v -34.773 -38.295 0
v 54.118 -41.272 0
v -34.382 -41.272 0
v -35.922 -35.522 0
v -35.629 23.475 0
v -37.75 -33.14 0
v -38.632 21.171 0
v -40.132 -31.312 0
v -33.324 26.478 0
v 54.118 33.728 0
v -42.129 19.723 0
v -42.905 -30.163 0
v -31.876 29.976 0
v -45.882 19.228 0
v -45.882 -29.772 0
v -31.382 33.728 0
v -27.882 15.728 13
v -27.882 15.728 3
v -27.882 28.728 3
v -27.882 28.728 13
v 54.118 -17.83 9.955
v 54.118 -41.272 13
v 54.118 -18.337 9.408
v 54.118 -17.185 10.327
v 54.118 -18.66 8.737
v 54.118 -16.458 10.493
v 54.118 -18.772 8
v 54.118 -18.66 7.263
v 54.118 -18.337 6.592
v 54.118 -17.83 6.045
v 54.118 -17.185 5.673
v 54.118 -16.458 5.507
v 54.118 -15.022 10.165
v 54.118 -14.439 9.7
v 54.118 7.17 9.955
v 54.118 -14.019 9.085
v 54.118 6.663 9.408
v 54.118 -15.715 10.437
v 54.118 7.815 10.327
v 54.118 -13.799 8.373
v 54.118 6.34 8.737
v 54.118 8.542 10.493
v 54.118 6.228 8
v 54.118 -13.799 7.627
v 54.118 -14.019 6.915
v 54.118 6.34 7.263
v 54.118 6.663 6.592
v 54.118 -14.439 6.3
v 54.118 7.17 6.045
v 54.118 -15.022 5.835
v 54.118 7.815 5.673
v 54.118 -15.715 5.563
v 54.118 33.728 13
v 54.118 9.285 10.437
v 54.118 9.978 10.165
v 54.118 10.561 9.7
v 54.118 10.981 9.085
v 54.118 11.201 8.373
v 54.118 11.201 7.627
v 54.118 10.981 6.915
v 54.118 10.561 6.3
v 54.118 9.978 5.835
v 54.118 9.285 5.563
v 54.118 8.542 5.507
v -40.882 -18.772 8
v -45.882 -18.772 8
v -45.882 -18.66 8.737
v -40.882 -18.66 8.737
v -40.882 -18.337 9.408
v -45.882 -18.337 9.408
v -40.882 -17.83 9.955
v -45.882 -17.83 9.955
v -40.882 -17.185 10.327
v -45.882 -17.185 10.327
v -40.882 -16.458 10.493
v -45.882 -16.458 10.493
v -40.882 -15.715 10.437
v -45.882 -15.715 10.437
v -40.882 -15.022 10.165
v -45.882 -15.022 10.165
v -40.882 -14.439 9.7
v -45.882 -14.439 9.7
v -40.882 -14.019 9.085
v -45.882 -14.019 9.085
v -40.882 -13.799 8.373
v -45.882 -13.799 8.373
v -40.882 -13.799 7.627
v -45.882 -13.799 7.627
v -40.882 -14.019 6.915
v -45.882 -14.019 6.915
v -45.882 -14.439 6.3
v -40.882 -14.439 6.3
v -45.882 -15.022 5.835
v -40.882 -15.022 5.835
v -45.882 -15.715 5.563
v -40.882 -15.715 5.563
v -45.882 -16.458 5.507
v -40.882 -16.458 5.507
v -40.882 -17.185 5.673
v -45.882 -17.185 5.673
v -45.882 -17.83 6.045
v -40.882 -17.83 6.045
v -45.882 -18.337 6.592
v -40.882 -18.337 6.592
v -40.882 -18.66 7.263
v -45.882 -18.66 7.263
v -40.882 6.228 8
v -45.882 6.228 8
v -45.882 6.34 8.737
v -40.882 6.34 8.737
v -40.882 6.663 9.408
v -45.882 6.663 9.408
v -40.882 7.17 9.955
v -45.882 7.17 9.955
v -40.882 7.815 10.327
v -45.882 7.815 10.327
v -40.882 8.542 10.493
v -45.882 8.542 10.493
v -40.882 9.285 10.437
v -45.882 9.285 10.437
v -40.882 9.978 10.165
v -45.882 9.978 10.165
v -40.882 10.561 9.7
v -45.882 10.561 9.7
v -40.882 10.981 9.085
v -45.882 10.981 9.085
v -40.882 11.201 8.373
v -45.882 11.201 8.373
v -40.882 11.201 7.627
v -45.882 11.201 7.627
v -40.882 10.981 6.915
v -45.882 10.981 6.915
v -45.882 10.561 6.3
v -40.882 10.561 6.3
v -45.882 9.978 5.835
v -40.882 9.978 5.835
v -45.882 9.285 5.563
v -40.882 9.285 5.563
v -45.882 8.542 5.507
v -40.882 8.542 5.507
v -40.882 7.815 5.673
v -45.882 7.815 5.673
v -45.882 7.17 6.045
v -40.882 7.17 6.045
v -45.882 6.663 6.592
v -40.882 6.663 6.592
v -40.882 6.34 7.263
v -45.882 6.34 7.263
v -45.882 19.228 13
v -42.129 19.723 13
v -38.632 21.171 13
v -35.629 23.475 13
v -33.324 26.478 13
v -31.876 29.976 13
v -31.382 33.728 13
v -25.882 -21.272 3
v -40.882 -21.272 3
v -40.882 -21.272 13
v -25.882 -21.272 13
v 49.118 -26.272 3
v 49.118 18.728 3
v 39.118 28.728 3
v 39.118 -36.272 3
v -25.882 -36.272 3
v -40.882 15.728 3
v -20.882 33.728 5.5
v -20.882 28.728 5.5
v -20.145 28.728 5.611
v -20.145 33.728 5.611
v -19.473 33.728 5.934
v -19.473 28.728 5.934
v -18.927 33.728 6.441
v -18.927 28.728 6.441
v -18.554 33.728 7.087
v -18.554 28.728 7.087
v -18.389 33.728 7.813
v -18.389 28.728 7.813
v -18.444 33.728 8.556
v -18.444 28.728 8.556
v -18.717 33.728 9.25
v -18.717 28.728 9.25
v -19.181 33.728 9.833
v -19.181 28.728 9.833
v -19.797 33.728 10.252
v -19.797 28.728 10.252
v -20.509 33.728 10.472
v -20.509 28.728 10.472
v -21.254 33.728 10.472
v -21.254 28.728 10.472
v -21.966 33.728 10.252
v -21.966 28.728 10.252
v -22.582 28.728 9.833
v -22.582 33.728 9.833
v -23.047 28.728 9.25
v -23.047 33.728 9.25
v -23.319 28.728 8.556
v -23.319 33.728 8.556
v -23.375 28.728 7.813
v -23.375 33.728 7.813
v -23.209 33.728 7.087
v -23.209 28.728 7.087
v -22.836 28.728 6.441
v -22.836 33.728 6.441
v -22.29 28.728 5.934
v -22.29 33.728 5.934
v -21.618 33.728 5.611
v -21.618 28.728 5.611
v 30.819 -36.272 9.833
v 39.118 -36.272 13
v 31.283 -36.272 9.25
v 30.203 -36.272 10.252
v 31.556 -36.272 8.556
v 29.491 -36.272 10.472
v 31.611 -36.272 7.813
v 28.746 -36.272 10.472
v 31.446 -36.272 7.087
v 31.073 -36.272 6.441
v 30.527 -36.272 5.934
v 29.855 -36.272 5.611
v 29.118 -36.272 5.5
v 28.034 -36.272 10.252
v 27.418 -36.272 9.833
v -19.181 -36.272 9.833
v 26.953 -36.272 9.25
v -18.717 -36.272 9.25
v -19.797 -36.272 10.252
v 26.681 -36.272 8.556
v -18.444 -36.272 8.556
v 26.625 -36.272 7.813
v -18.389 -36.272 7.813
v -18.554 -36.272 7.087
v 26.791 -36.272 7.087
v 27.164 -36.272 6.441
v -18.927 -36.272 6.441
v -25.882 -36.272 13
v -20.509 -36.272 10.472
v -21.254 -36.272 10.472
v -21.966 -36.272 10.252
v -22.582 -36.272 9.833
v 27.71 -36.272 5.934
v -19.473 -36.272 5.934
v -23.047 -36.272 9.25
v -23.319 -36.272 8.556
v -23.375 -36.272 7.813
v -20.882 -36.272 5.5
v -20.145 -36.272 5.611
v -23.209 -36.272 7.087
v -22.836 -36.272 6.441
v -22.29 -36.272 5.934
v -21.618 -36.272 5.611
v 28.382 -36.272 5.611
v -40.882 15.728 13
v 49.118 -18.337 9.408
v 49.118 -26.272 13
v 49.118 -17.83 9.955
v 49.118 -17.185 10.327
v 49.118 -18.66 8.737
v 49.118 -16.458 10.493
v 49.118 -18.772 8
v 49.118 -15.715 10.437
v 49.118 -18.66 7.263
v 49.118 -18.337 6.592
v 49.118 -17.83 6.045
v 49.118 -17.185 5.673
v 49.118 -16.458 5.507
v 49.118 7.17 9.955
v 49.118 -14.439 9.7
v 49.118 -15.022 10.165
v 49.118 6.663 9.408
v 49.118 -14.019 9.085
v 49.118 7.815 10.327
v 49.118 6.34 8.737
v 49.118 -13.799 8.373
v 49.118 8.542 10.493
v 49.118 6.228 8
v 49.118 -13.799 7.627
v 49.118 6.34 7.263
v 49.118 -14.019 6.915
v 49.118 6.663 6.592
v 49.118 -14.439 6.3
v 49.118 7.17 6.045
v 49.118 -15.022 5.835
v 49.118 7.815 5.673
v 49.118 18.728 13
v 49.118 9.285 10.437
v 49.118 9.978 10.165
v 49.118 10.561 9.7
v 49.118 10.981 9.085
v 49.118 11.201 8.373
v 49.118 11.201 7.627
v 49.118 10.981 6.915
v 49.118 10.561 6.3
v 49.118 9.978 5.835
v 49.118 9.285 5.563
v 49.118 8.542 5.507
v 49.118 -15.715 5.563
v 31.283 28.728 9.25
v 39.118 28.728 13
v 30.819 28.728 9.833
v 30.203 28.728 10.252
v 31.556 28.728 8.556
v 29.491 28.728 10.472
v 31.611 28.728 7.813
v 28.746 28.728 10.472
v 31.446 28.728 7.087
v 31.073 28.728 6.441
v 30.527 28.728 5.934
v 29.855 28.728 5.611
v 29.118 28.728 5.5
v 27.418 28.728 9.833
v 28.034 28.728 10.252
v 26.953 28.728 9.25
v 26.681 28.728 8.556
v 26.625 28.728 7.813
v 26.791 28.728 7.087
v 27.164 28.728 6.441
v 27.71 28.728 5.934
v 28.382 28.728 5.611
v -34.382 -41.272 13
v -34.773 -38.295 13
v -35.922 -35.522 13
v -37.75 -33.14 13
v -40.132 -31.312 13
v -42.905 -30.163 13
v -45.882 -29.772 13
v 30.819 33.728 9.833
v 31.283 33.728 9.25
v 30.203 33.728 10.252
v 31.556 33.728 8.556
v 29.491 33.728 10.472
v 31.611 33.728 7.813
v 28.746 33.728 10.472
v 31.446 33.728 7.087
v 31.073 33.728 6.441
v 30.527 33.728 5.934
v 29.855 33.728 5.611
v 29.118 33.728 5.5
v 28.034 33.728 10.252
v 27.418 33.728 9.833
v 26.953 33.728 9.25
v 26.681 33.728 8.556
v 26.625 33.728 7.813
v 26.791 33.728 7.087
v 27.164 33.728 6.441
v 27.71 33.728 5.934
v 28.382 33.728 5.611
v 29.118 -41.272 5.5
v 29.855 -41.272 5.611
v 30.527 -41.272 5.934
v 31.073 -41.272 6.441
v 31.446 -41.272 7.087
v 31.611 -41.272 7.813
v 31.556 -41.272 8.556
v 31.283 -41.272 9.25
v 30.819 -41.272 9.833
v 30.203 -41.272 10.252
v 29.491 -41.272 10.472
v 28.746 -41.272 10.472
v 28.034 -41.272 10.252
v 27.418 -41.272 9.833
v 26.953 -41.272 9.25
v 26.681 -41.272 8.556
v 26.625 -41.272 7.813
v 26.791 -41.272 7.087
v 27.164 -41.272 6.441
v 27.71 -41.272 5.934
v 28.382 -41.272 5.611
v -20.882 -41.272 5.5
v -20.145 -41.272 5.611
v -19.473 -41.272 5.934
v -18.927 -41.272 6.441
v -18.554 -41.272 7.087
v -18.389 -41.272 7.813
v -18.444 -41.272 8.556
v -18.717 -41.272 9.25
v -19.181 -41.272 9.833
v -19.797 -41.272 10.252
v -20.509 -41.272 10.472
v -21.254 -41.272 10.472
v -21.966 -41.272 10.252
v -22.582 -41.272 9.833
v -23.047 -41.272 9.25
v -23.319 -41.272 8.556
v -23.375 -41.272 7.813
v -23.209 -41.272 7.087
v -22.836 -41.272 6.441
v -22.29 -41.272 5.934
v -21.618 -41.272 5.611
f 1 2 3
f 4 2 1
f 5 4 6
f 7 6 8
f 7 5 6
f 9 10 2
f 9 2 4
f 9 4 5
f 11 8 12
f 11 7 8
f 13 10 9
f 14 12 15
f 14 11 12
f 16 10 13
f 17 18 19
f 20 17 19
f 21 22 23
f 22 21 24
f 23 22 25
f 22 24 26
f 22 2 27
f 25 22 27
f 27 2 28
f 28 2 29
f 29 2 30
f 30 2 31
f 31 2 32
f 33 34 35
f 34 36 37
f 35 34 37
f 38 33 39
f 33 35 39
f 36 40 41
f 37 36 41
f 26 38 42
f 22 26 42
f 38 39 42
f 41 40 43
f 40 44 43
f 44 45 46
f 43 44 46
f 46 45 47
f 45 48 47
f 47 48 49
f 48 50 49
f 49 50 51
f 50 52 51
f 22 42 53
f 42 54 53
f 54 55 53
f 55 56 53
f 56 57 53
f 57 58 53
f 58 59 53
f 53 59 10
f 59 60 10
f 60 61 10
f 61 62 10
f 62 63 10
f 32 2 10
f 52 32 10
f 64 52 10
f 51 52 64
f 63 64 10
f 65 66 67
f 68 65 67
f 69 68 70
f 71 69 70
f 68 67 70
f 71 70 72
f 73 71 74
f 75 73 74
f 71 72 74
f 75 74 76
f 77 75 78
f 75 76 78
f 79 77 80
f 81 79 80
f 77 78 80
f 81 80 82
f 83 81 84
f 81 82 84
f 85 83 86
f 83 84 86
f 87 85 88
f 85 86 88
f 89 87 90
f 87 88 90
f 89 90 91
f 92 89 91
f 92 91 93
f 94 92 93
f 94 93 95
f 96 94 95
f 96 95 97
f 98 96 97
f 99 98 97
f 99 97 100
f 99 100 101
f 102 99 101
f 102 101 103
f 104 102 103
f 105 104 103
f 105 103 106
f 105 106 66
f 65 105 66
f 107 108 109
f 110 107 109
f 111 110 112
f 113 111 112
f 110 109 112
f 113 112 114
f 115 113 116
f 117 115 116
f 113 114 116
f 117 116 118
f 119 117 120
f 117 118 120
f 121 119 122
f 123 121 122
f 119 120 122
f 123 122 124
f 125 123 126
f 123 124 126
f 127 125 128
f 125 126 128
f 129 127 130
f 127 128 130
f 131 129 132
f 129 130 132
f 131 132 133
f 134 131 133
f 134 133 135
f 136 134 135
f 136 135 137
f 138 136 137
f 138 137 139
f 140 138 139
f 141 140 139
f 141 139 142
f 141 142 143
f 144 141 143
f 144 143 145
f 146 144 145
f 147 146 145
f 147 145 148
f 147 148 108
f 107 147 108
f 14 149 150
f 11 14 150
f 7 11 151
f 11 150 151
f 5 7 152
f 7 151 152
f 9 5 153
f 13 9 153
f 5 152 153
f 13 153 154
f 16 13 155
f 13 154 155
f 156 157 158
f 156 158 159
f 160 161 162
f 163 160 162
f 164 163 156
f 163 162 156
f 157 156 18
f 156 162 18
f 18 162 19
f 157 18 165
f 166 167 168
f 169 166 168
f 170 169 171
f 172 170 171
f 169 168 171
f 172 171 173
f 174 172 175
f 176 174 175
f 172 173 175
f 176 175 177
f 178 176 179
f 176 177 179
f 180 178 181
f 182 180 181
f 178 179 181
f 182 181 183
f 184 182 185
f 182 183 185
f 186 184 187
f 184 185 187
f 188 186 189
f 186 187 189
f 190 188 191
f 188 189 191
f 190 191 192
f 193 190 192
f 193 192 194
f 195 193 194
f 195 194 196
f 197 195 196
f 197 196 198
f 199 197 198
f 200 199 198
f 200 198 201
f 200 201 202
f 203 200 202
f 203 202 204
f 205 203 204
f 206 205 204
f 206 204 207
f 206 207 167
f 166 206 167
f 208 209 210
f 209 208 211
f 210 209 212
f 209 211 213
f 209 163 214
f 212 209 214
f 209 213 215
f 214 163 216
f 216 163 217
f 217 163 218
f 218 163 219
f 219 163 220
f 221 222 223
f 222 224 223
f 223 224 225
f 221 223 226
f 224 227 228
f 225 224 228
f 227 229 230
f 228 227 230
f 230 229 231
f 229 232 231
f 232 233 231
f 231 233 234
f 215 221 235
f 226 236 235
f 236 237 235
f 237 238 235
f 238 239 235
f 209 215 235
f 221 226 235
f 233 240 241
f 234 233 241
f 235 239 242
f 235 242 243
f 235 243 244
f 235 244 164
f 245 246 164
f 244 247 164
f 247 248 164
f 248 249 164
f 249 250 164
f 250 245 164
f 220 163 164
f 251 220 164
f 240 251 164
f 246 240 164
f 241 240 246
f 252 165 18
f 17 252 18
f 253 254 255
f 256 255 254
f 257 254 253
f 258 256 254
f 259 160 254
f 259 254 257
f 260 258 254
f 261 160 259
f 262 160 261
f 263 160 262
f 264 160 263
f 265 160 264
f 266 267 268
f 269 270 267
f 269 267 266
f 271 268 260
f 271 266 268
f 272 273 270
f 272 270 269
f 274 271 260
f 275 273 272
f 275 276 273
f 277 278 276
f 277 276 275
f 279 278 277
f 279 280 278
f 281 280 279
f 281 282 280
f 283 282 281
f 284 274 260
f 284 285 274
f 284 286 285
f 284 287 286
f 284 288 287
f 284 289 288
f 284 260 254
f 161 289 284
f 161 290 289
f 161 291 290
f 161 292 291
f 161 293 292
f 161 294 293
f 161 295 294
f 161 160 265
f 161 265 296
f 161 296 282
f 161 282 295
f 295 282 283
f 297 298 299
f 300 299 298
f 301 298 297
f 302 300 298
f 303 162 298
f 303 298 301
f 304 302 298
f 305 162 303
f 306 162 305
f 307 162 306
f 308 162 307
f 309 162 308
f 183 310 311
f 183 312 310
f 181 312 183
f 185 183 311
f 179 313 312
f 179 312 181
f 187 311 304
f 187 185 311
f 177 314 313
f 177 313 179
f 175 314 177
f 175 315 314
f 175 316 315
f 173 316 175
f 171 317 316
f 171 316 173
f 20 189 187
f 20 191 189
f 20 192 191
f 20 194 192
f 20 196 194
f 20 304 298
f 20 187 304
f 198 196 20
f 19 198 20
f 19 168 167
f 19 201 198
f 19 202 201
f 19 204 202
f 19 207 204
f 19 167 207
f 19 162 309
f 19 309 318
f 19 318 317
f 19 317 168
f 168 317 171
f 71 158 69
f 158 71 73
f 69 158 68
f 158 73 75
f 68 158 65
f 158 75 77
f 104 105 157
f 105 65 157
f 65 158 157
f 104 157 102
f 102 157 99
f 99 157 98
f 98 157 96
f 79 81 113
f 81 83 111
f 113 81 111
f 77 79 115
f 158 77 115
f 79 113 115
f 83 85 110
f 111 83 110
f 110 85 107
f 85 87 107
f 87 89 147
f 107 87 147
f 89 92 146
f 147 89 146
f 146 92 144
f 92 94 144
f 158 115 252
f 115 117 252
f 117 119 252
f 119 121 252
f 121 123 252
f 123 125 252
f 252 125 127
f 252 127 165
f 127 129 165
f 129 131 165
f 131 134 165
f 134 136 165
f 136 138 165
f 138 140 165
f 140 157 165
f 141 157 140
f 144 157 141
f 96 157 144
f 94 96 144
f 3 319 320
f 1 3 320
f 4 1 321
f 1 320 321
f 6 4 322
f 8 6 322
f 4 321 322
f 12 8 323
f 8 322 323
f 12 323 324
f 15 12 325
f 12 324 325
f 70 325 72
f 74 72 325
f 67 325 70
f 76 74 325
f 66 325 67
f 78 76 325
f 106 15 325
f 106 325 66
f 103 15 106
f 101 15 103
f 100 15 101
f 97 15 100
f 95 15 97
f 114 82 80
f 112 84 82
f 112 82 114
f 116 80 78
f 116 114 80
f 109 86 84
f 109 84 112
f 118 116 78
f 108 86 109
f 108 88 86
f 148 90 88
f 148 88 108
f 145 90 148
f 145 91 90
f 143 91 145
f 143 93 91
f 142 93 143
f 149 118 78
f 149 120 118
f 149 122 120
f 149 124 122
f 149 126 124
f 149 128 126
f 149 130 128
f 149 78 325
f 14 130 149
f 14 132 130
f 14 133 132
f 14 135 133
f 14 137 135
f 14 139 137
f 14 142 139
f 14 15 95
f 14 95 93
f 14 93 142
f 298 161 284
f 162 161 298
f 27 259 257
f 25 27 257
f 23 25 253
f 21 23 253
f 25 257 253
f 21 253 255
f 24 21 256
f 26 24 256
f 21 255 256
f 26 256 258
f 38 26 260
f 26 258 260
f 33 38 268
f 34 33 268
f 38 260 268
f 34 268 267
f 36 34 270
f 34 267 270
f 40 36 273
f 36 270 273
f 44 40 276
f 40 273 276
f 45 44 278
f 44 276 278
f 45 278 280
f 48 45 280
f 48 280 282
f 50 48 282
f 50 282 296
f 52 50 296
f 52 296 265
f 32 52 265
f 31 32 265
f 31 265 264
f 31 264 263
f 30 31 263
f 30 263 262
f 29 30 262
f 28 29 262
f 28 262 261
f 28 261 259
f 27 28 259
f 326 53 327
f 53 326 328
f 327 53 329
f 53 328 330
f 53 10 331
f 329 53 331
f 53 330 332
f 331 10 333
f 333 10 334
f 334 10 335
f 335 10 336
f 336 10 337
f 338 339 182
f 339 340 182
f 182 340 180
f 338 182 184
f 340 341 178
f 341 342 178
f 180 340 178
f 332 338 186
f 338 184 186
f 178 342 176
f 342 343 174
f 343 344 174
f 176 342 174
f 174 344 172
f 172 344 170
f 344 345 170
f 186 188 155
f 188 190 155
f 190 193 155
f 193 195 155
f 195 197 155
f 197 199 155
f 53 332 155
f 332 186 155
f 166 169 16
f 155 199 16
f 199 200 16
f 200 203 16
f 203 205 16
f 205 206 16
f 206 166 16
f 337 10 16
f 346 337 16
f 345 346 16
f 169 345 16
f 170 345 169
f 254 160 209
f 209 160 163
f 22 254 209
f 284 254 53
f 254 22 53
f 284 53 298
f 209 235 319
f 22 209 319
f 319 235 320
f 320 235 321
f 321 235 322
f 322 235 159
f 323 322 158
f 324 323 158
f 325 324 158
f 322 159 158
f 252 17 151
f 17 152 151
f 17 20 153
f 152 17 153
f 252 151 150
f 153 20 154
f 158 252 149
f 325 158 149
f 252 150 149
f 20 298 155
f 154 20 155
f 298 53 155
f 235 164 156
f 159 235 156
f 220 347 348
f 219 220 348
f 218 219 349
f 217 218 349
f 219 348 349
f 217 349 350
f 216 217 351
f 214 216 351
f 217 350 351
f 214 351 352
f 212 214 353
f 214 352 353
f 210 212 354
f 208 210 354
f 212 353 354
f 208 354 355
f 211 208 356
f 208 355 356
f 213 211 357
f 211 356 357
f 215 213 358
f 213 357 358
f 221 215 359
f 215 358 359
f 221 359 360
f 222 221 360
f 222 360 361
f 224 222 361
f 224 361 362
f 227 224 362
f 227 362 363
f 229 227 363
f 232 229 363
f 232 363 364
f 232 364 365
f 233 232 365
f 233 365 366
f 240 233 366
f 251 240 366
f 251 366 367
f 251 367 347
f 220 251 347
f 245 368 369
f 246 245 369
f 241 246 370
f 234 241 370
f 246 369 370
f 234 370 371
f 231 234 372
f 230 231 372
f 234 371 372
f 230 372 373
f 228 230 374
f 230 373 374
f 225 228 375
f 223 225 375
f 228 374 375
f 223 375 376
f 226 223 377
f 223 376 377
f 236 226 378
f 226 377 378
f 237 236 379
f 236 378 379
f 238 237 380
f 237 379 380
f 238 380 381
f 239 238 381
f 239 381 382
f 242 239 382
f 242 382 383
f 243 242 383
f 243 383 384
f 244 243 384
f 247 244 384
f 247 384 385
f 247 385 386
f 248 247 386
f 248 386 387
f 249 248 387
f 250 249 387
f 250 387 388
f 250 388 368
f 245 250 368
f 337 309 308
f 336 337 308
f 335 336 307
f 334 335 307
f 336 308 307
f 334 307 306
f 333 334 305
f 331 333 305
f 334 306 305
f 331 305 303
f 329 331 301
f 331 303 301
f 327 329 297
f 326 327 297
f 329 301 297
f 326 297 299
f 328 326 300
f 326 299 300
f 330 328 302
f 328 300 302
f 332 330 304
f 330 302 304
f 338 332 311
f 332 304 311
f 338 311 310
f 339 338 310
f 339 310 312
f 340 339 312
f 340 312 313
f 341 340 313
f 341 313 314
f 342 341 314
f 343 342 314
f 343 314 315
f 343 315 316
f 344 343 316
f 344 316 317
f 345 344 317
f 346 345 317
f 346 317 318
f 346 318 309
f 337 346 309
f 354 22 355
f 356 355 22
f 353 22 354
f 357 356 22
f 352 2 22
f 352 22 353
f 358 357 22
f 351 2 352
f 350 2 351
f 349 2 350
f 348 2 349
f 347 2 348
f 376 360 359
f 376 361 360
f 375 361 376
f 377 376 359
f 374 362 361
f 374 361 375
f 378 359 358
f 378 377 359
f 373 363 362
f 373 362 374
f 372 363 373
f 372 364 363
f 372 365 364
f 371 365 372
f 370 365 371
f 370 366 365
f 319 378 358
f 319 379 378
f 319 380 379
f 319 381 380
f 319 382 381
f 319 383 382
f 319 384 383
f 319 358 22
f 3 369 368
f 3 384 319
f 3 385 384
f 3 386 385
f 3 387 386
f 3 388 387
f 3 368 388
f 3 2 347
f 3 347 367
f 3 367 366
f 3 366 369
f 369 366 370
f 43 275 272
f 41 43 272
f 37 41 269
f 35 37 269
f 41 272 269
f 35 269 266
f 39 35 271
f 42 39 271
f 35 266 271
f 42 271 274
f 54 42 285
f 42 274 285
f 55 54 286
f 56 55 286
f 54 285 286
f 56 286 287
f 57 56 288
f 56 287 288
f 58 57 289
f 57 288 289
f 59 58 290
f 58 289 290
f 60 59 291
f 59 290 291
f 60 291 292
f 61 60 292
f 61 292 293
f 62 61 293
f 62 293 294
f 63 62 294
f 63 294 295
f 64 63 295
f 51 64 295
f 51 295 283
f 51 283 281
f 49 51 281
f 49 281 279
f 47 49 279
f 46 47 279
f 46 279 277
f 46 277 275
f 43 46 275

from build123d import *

# Parameters (mm, degrees)
BOSS_EXTRU_1_DEPTH        = 13
COQUE1_T                  = -5
COQUE1_THICKNESS_2_FACE_W = 90
COQUE1_THICKNESS_2_FACE_H = 65
COQUE1_THICKNESS_2_DEPTH  = 2
ENL_V_MAT_EXTRU_1_REACH   = 110.96
ESQUISSE2_R               = 2.5
ENL_V_MAT_EXTRU_2_REACH   = 95.396
ESQUISSE3_R               = 2.5
ESQUISSE4_W               = 18
ESQUISSE4_H               = 18
ESQUISSE4_W_2             = 15
ESQUISSE4_H_2             = 15
BOSS_EXTRU_2_DEPTH        = 10
ESQUISSE6_R               = 11.5
ESQUISSE6_R_2             = 14.5
ENL_V_MAT_EXTRU_4_DEPTH   = 13


with BuildPart() as part:
    # Esquisse1 → Boss.-Extru.1 (new body)
    with BuildSketch(Plane.XY):
        Polygon((44.118436308, 33.728448276), (54.118436308, 33.728448276), (54.118436308, 23.728448276), (54.118436308, -41.271551724), (-45.881563692, -41.271551724), (-45.881563692, 33.728448276), align=None)
    extrude(amount=BOSS_EXTRU_1_DEPTH)

    # Coque1
    coque1_openings = [part.faces().sort_by_distance(p)[0] for p in [
        (4.118436308, -3.771551724, 13),
    ]]
    offset(amount=COQUE1_T, openings=coque1_openings, kind=Kind.INTERSECTION)

    # Coque1 thickness 2 face (on inner face of the shell) → Coque1 thickness 2 (cut)
    with BuildSketch(Plane(origin=(4.118436308, -3.771551724, 5), x_dir=(-1, 0, 0), z_dir=(0, 0, -1))):
        Rectangle(COQUE1_THICKNESS_2_FACE_W, COQUE1_THICKNESS_2_FACE_H)
    extrude(amount=COQUE1_THICKNESS_2_DEPTH, mode=Mode.SUBTRACT)

    # Enlèv. mat.-Extru.1: up to this face of the body (flat: up to its plane)
    enl_v_mat_extru_1_end = Plane(part.part.faces().sort_by_distance((54.118436308, -3.771551724, 6.5))[0])
    # Esquisse2 → Enlèv. mat.-Extru.1 (cut, up to the picked face)
    with BuildSketch(Plane.ZY.offset(45.881563692), mode=Mode.PRIVATE) as enl_v_mat_extru_1_sk1:
        with Locations(Location((8, -16.271551724, 0), (0, 0, 270))):
            Circle(ESQUISSE2_R)
    enl_v_mat_extru_1_tool1 = split(extrude(enl_v_mat_extru_1_sk1.sketch, amount=-ENL_V_MAT_EXTRU_1_REACH, mode=Mode.PRIVATE), bisect_by=enl_v_mat_extru_1_end, keep=Keep.BOTH, mode=Mode.PRIVATE)
    # Esquisse2 → Enlèv. mat.-Extru.1 (cut, up to the picked face)
    with BuildSketch(Plane.ZY.offset(45.881563692), mode=Mode.PRIVATE) as enl_v_mat_extru_1_sk2:
        with Locations(Location((8, 8.728448276, 0), (0, 0, 270))):
            Circle(ESQUISSE2_R)
    enl_v_mat_extru_1_tool2 = split(extrude(enl_v_mat_extru_1_sk2.sketch, amount=-ENL_V_MAT_EXTRU_1_REACH, mode=Mode.PRIVATE), bisect_by=enl_v_mat_extru_1_end, keep=Keep.BOTH, mode=Mode.PRIVATE)
    add(enl_v_mat_extru_1_tool1.solids().sort_by(Axis((-45.881564, -16.271552, 8), (1, 0, 0)))[0], mode=Mode.SUBTRACT)
    add(enl_v_mat_extru_1_tool2.solids().sort_by(Axis((-45.881564, 8.728448, 8), (1, 0, 0)))[0], mode=Mode.SUBTRACT)

    # Enlèv. mat.-Extru.2: up to this face of the body (flat: up to its plane)
    enl_v_mat_extru_2_end = Plane(part.part.faces().sort_by_distance((4.118436308, 33.728448276, 6.5))[0])
    # Esquisse3 → Enlèv. mat.-Extru.2 (cut, up to the picked face)
    with BuildSketch(Plane.XZ.offset(41.271551724), mode=Mode.PRIVATE) as enl_v_mat_extru_2_sk1:
        with Locations(Location((-20.881563692, 8, 0), (0, 0, 270))):
            Circle(ESQUISSE3_R)
    enl_v_mat_extru_2_tool1 = split(extrude(enl_v_mat_extru_2_sk1.sketch, amount=-ENL_V_MAT_EXTRU_2_REACH, mode=Mode.PRIVATE), bisect_by=enl_v_mat_extru_2_end, keep=Keep.BOTH, mode=Mode.PRIVATE)
    # Esquisse3 → Enlèv. mat.-Extru.2 (cut, up to the picked face)
    with BuildSketch(Plane.XZ.offset(41.271551724), mode=Mode.PRIVATE) as enl_v_mat_extru_2_sk2:
        with Locations(Location((29.118436308, 8, 0), (0, 0, 270))):
            Circle(ESQUISSE3_R)
    enl_v_mat_extru_2_tool2 = split(extrude(enl_v_mat_extru_2_sk2.sketch, amount=-ENL_V_MAT_EXTRU_2_REACH, mode=Mode.PRIVATE), bisect_by=enl_v_mat_extru_2_end, keep=Keep.BOTH, mode=Mode.PRIVATE)
    add(enl_v_mat_extru_2_tool1.solids().sort_by(Axis((-20.881564, -41.271552, 8), (0, 1, 0)))[0], mode=Mode.SUBTRACT)
    add(enl_v_mat_extru_2_tool2.solids().sort_by(Axis((29.118436, -41.271552, 8), (0, 1, 0)))[0], mode=Mode.SUBTRACT)

    # Esquisse4 → Boss.-Extru.2 (add)
    with BuildSketch(Plane.XY.offset(3)):
        with Locations((-36.881563692, 24.728448276)):
            Rectangle(ESQUISSE4_W, ESQUISSE4_H)
        Polygon((49.118436308, 28.728448276), (49.118436308, 18.728448276), (39.118436308, 28.728448276), align=None)
        Polygon((49.118436308, -36.271551724), (49.118436308, -26.271551724), (39.118436308, -36.271551724), align=None)
        with Locations((-33.381563692, -28.771551724)):
            Rectangle(ESQUISSE4_W_2, ESQUISSE4_H_2)
    extrude(amount=BOSS_EXTRU_2_DEPTH)

    # Esquisse6 → Enlèv. mat.-Extru.4 (cut)
    with BuildSketch(Plane.XY.offset(13)):
        with Locations((-45.881563692, -41.271551724)):
            Circle(ESQUISSE6_R)
        with Locations((-45.881563692, 33.728448276)):
            Circle(ESQUISSE6_R_2)
    extrude(amount=-ENL_V_MAT_EXTRU_4_DEPTH, mode=Mode.SUBTRACT)


solid = part.part
